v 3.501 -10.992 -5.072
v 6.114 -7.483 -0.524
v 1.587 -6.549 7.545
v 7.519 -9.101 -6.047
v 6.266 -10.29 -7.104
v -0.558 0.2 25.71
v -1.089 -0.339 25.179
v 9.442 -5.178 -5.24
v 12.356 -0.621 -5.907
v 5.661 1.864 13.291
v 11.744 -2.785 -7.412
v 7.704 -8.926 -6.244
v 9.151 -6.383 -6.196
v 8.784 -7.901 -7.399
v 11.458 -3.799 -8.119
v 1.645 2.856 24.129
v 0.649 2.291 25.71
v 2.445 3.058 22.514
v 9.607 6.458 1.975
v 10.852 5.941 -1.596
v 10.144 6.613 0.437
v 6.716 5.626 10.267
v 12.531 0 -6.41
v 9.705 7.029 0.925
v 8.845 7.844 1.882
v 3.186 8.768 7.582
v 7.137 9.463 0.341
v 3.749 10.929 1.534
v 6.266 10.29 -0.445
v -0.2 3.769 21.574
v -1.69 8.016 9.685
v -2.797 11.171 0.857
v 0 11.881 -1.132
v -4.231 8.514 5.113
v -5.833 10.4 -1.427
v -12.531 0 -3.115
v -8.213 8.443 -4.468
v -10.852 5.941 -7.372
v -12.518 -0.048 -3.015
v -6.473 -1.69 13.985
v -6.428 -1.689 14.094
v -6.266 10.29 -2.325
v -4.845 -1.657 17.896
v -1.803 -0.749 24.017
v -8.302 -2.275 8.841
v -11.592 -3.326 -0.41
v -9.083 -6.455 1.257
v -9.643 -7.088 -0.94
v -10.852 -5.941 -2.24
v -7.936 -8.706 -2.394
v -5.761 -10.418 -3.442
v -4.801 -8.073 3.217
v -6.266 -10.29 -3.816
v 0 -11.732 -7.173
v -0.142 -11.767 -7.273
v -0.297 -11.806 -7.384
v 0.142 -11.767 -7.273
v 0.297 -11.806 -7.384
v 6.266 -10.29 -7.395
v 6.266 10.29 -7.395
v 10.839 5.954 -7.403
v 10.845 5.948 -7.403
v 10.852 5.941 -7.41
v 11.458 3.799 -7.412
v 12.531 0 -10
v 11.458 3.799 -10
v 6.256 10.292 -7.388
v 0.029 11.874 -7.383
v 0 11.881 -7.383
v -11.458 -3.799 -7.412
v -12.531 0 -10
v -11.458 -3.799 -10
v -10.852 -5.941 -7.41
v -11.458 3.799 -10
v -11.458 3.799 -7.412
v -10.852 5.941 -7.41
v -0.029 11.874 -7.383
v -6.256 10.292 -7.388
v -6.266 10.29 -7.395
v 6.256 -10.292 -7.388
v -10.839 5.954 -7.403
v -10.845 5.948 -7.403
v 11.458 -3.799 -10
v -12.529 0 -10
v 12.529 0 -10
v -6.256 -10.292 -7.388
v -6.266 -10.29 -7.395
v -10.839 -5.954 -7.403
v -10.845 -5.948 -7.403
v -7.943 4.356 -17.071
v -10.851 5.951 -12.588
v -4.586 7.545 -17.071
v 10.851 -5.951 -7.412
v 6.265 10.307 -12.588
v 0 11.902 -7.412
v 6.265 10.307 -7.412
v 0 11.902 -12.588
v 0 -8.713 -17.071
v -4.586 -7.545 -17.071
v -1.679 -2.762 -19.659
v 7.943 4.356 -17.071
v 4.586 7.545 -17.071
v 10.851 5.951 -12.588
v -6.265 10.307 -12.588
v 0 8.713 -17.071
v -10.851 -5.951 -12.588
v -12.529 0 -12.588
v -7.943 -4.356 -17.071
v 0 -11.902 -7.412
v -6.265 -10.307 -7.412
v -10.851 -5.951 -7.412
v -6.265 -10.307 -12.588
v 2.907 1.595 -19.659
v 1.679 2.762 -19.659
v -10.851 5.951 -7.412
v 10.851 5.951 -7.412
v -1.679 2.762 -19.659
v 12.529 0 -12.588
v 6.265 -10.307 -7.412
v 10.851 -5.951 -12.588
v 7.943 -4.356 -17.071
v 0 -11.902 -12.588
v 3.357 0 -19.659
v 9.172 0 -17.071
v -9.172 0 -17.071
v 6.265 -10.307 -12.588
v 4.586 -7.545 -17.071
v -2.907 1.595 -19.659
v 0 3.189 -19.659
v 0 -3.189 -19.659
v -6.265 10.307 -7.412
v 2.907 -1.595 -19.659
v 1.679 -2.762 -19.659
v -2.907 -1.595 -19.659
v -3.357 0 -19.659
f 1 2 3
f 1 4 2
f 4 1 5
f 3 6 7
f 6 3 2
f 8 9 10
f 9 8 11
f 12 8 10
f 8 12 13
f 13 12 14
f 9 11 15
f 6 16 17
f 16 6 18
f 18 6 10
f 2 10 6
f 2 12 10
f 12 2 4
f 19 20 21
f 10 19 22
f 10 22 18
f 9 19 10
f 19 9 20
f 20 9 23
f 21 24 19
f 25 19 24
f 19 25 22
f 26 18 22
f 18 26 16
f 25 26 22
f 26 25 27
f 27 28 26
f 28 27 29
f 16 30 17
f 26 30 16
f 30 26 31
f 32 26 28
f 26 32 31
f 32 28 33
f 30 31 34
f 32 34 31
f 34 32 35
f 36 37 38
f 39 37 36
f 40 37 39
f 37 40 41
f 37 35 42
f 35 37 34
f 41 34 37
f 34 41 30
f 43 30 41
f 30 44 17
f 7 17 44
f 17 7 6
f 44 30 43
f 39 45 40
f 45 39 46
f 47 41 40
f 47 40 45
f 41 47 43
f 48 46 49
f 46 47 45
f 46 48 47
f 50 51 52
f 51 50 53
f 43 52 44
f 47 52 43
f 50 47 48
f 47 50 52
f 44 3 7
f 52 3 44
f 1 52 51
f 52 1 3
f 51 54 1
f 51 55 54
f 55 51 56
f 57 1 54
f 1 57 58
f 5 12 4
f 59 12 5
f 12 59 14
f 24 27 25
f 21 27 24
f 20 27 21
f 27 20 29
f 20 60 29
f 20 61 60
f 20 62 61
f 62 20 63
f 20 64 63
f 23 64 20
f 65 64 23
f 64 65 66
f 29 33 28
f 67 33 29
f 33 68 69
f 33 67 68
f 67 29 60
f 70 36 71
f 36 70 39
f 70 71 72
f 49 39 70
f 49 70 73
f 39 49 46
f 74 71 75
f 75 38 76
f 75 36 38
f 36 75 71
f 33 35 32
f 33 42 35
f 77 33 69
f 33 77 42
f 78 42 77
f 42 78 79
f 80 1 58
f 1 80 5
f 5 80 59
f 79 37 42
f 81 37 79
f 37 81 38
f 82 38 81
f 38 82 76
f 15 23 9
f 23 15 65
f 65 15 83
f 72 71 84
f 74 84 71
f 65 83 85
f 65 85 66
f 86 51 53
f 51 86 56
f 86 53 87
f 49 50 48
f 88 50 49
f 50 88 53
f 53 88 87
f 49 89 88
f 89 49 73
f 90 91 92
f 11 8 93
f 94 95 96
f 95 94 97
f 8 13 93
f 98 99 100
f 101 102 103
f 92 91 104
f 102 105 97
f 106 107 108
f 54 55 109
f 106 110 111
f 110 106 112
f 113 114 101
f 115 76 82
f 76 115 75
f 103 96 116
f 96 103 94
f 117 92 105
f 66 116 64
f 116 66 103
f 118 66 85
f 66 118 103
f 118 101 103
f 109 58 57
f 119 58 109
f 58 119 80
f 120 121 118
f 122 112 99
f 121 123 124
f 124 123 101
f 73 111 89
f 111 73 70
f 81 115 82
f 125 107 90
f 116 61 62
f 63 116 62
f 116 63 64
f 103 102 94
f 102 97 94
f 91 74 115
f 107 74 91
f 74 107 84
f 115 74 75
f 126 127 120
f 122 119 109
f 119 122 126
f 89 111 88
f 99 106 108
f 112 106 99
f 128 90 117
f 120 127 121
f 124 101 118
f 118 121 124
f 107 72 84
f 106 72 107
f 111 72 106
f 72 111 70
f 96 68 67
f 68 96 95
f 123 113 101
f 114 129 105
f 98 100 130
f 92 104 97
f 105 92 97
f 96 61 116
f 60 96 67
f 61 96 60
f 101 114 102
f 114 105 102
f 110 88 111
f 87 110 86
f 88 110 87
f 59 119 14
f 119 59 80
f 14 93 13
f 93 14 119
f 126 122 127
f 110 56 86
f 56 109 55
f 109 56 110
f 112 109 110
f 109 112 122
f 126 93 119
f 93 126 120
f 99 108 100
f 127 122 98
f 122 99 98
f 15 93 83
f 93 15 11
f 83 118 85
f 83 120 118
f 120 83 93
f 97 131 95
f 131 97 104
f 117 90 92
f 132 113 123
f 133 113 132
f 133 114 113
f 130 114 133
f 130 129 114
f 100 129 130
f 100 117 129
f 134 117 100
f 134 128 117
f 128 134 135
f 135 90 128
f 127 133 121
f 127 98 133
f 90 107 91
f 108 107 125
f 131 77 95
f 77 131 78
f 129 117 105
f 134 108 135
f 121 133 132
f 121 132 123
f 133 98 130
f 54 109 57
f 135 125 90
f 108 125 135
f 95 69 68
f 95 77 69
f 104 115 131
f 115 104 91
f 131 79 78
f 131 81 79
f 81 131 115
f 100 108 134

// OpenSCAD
// Procedurally generates a crystal suitable for an Aeldari objective marker.
// The crystal is generally spear-tip shaped. The crystals are randonly
// generated and meant to have some organic "slop" to them - they aren't perfect
// polyhedrons. Lots of variables exist to tune the size, length, variance, etc.
//
// See crystal-tip-preview-01.png for what this could look like.
//
// There are some good crystal generators out there, but I wanted my crystal to
// be spear-tip shaped and have a very short "neck" or body. It's sized to fit
// in the detatchable lids found in Nuun hydration tablet containers (and
// probably others). If someone wants to contribute some good presets, I am
// happy to include them here.
//
// The tablets, for reference: https://nuunlife.com/
//
// A more generic source listing for these containers would be wonderful to
// share. I believe I have seen them elsewhere, but have nothing to reference.
//
// Honorable mention (both links are for the same effort/model):
// https://www.thingiverse.com/thing:4210463
// https://cults3d.com/en/3d-model/game/openscad-crystal-procedural-generator
//

seed = 14;
diameter = 20;
height = 50;
sides = 12;
vScale = 0.3;
cylinderOffset=15;

module crystalTip(
  seed,
  sides,
  intersectionOffset,
  cylinderOffset,
  diameter,
  height,
  sharpness,
  vHeight,
  vSharpness,
  vScale
) {
  $fn=sides;
  difference() {
    scale([
      1 + rands(-vScale, vScale, 1, seed)[0],
      1 + rands(-vScale, vScale, 1, seed + 1)[0],
      1,
    ])
      translate([0, 0, cylinderOffset])
      cylinder(d=diameter, h=height, center = true);
    for(i=[0 : sides]) {
      let(
        // TODO: Use this rotation to compute the proper offset to shift the
        // cylinder downwards.
        rotation = sharpness + rands(-vSharpness, vSharpness, 1, seed + i + 3)[0]
      ) {
      translate([
        0,
        0,
      ])
        rotate([
          rotation,
          0,
          i / $fn * 360,
        ])
        translate([
          0,
          0,
          intersectionOffset + rands(-vHeight, vHeight, 1, seed + i + 2)[0],
        ])
          cube([diameter * 2, height * 2, diameter * 2], center = true);
      }
    }
  }
}

/* crystalTip( */
/*   seed, */
/*   6, // Sides. */
/*   90, // Intersection Offset. */
/*   30, // Diameter. */
/*   90, // Height. */
/*   50, // Sharpness. */
/*   6,  // Height variance. */
/*   3,  // Sharpness variance. */
/*   0.3 // Scale variance. */
/* ); */

crystalTip(
  seed,
  sides, // Sides.
  30, // Intersection Offset.
  cylinderOffset,
  diameter,
  height, // Height.
  70, // Sharpness.
  2,  // Height variance.
  1,  // Sharpness variance.
  vScale // Scale variance.
);

// Ugh. Why do we have to fix these two?
sphereFix=1.044;
translate([0, 0, -height / 2 + cylinderOffset ])
  scale([
    sphereFix * 1 + rands(-vScale, vScale, 1, seed)[0],
    sphereFix * 1 + rands(-vScale, vScale, 1, seed + 1)[0],
    1,
  ])
  sphere(d=diameter, $fn=sides);
